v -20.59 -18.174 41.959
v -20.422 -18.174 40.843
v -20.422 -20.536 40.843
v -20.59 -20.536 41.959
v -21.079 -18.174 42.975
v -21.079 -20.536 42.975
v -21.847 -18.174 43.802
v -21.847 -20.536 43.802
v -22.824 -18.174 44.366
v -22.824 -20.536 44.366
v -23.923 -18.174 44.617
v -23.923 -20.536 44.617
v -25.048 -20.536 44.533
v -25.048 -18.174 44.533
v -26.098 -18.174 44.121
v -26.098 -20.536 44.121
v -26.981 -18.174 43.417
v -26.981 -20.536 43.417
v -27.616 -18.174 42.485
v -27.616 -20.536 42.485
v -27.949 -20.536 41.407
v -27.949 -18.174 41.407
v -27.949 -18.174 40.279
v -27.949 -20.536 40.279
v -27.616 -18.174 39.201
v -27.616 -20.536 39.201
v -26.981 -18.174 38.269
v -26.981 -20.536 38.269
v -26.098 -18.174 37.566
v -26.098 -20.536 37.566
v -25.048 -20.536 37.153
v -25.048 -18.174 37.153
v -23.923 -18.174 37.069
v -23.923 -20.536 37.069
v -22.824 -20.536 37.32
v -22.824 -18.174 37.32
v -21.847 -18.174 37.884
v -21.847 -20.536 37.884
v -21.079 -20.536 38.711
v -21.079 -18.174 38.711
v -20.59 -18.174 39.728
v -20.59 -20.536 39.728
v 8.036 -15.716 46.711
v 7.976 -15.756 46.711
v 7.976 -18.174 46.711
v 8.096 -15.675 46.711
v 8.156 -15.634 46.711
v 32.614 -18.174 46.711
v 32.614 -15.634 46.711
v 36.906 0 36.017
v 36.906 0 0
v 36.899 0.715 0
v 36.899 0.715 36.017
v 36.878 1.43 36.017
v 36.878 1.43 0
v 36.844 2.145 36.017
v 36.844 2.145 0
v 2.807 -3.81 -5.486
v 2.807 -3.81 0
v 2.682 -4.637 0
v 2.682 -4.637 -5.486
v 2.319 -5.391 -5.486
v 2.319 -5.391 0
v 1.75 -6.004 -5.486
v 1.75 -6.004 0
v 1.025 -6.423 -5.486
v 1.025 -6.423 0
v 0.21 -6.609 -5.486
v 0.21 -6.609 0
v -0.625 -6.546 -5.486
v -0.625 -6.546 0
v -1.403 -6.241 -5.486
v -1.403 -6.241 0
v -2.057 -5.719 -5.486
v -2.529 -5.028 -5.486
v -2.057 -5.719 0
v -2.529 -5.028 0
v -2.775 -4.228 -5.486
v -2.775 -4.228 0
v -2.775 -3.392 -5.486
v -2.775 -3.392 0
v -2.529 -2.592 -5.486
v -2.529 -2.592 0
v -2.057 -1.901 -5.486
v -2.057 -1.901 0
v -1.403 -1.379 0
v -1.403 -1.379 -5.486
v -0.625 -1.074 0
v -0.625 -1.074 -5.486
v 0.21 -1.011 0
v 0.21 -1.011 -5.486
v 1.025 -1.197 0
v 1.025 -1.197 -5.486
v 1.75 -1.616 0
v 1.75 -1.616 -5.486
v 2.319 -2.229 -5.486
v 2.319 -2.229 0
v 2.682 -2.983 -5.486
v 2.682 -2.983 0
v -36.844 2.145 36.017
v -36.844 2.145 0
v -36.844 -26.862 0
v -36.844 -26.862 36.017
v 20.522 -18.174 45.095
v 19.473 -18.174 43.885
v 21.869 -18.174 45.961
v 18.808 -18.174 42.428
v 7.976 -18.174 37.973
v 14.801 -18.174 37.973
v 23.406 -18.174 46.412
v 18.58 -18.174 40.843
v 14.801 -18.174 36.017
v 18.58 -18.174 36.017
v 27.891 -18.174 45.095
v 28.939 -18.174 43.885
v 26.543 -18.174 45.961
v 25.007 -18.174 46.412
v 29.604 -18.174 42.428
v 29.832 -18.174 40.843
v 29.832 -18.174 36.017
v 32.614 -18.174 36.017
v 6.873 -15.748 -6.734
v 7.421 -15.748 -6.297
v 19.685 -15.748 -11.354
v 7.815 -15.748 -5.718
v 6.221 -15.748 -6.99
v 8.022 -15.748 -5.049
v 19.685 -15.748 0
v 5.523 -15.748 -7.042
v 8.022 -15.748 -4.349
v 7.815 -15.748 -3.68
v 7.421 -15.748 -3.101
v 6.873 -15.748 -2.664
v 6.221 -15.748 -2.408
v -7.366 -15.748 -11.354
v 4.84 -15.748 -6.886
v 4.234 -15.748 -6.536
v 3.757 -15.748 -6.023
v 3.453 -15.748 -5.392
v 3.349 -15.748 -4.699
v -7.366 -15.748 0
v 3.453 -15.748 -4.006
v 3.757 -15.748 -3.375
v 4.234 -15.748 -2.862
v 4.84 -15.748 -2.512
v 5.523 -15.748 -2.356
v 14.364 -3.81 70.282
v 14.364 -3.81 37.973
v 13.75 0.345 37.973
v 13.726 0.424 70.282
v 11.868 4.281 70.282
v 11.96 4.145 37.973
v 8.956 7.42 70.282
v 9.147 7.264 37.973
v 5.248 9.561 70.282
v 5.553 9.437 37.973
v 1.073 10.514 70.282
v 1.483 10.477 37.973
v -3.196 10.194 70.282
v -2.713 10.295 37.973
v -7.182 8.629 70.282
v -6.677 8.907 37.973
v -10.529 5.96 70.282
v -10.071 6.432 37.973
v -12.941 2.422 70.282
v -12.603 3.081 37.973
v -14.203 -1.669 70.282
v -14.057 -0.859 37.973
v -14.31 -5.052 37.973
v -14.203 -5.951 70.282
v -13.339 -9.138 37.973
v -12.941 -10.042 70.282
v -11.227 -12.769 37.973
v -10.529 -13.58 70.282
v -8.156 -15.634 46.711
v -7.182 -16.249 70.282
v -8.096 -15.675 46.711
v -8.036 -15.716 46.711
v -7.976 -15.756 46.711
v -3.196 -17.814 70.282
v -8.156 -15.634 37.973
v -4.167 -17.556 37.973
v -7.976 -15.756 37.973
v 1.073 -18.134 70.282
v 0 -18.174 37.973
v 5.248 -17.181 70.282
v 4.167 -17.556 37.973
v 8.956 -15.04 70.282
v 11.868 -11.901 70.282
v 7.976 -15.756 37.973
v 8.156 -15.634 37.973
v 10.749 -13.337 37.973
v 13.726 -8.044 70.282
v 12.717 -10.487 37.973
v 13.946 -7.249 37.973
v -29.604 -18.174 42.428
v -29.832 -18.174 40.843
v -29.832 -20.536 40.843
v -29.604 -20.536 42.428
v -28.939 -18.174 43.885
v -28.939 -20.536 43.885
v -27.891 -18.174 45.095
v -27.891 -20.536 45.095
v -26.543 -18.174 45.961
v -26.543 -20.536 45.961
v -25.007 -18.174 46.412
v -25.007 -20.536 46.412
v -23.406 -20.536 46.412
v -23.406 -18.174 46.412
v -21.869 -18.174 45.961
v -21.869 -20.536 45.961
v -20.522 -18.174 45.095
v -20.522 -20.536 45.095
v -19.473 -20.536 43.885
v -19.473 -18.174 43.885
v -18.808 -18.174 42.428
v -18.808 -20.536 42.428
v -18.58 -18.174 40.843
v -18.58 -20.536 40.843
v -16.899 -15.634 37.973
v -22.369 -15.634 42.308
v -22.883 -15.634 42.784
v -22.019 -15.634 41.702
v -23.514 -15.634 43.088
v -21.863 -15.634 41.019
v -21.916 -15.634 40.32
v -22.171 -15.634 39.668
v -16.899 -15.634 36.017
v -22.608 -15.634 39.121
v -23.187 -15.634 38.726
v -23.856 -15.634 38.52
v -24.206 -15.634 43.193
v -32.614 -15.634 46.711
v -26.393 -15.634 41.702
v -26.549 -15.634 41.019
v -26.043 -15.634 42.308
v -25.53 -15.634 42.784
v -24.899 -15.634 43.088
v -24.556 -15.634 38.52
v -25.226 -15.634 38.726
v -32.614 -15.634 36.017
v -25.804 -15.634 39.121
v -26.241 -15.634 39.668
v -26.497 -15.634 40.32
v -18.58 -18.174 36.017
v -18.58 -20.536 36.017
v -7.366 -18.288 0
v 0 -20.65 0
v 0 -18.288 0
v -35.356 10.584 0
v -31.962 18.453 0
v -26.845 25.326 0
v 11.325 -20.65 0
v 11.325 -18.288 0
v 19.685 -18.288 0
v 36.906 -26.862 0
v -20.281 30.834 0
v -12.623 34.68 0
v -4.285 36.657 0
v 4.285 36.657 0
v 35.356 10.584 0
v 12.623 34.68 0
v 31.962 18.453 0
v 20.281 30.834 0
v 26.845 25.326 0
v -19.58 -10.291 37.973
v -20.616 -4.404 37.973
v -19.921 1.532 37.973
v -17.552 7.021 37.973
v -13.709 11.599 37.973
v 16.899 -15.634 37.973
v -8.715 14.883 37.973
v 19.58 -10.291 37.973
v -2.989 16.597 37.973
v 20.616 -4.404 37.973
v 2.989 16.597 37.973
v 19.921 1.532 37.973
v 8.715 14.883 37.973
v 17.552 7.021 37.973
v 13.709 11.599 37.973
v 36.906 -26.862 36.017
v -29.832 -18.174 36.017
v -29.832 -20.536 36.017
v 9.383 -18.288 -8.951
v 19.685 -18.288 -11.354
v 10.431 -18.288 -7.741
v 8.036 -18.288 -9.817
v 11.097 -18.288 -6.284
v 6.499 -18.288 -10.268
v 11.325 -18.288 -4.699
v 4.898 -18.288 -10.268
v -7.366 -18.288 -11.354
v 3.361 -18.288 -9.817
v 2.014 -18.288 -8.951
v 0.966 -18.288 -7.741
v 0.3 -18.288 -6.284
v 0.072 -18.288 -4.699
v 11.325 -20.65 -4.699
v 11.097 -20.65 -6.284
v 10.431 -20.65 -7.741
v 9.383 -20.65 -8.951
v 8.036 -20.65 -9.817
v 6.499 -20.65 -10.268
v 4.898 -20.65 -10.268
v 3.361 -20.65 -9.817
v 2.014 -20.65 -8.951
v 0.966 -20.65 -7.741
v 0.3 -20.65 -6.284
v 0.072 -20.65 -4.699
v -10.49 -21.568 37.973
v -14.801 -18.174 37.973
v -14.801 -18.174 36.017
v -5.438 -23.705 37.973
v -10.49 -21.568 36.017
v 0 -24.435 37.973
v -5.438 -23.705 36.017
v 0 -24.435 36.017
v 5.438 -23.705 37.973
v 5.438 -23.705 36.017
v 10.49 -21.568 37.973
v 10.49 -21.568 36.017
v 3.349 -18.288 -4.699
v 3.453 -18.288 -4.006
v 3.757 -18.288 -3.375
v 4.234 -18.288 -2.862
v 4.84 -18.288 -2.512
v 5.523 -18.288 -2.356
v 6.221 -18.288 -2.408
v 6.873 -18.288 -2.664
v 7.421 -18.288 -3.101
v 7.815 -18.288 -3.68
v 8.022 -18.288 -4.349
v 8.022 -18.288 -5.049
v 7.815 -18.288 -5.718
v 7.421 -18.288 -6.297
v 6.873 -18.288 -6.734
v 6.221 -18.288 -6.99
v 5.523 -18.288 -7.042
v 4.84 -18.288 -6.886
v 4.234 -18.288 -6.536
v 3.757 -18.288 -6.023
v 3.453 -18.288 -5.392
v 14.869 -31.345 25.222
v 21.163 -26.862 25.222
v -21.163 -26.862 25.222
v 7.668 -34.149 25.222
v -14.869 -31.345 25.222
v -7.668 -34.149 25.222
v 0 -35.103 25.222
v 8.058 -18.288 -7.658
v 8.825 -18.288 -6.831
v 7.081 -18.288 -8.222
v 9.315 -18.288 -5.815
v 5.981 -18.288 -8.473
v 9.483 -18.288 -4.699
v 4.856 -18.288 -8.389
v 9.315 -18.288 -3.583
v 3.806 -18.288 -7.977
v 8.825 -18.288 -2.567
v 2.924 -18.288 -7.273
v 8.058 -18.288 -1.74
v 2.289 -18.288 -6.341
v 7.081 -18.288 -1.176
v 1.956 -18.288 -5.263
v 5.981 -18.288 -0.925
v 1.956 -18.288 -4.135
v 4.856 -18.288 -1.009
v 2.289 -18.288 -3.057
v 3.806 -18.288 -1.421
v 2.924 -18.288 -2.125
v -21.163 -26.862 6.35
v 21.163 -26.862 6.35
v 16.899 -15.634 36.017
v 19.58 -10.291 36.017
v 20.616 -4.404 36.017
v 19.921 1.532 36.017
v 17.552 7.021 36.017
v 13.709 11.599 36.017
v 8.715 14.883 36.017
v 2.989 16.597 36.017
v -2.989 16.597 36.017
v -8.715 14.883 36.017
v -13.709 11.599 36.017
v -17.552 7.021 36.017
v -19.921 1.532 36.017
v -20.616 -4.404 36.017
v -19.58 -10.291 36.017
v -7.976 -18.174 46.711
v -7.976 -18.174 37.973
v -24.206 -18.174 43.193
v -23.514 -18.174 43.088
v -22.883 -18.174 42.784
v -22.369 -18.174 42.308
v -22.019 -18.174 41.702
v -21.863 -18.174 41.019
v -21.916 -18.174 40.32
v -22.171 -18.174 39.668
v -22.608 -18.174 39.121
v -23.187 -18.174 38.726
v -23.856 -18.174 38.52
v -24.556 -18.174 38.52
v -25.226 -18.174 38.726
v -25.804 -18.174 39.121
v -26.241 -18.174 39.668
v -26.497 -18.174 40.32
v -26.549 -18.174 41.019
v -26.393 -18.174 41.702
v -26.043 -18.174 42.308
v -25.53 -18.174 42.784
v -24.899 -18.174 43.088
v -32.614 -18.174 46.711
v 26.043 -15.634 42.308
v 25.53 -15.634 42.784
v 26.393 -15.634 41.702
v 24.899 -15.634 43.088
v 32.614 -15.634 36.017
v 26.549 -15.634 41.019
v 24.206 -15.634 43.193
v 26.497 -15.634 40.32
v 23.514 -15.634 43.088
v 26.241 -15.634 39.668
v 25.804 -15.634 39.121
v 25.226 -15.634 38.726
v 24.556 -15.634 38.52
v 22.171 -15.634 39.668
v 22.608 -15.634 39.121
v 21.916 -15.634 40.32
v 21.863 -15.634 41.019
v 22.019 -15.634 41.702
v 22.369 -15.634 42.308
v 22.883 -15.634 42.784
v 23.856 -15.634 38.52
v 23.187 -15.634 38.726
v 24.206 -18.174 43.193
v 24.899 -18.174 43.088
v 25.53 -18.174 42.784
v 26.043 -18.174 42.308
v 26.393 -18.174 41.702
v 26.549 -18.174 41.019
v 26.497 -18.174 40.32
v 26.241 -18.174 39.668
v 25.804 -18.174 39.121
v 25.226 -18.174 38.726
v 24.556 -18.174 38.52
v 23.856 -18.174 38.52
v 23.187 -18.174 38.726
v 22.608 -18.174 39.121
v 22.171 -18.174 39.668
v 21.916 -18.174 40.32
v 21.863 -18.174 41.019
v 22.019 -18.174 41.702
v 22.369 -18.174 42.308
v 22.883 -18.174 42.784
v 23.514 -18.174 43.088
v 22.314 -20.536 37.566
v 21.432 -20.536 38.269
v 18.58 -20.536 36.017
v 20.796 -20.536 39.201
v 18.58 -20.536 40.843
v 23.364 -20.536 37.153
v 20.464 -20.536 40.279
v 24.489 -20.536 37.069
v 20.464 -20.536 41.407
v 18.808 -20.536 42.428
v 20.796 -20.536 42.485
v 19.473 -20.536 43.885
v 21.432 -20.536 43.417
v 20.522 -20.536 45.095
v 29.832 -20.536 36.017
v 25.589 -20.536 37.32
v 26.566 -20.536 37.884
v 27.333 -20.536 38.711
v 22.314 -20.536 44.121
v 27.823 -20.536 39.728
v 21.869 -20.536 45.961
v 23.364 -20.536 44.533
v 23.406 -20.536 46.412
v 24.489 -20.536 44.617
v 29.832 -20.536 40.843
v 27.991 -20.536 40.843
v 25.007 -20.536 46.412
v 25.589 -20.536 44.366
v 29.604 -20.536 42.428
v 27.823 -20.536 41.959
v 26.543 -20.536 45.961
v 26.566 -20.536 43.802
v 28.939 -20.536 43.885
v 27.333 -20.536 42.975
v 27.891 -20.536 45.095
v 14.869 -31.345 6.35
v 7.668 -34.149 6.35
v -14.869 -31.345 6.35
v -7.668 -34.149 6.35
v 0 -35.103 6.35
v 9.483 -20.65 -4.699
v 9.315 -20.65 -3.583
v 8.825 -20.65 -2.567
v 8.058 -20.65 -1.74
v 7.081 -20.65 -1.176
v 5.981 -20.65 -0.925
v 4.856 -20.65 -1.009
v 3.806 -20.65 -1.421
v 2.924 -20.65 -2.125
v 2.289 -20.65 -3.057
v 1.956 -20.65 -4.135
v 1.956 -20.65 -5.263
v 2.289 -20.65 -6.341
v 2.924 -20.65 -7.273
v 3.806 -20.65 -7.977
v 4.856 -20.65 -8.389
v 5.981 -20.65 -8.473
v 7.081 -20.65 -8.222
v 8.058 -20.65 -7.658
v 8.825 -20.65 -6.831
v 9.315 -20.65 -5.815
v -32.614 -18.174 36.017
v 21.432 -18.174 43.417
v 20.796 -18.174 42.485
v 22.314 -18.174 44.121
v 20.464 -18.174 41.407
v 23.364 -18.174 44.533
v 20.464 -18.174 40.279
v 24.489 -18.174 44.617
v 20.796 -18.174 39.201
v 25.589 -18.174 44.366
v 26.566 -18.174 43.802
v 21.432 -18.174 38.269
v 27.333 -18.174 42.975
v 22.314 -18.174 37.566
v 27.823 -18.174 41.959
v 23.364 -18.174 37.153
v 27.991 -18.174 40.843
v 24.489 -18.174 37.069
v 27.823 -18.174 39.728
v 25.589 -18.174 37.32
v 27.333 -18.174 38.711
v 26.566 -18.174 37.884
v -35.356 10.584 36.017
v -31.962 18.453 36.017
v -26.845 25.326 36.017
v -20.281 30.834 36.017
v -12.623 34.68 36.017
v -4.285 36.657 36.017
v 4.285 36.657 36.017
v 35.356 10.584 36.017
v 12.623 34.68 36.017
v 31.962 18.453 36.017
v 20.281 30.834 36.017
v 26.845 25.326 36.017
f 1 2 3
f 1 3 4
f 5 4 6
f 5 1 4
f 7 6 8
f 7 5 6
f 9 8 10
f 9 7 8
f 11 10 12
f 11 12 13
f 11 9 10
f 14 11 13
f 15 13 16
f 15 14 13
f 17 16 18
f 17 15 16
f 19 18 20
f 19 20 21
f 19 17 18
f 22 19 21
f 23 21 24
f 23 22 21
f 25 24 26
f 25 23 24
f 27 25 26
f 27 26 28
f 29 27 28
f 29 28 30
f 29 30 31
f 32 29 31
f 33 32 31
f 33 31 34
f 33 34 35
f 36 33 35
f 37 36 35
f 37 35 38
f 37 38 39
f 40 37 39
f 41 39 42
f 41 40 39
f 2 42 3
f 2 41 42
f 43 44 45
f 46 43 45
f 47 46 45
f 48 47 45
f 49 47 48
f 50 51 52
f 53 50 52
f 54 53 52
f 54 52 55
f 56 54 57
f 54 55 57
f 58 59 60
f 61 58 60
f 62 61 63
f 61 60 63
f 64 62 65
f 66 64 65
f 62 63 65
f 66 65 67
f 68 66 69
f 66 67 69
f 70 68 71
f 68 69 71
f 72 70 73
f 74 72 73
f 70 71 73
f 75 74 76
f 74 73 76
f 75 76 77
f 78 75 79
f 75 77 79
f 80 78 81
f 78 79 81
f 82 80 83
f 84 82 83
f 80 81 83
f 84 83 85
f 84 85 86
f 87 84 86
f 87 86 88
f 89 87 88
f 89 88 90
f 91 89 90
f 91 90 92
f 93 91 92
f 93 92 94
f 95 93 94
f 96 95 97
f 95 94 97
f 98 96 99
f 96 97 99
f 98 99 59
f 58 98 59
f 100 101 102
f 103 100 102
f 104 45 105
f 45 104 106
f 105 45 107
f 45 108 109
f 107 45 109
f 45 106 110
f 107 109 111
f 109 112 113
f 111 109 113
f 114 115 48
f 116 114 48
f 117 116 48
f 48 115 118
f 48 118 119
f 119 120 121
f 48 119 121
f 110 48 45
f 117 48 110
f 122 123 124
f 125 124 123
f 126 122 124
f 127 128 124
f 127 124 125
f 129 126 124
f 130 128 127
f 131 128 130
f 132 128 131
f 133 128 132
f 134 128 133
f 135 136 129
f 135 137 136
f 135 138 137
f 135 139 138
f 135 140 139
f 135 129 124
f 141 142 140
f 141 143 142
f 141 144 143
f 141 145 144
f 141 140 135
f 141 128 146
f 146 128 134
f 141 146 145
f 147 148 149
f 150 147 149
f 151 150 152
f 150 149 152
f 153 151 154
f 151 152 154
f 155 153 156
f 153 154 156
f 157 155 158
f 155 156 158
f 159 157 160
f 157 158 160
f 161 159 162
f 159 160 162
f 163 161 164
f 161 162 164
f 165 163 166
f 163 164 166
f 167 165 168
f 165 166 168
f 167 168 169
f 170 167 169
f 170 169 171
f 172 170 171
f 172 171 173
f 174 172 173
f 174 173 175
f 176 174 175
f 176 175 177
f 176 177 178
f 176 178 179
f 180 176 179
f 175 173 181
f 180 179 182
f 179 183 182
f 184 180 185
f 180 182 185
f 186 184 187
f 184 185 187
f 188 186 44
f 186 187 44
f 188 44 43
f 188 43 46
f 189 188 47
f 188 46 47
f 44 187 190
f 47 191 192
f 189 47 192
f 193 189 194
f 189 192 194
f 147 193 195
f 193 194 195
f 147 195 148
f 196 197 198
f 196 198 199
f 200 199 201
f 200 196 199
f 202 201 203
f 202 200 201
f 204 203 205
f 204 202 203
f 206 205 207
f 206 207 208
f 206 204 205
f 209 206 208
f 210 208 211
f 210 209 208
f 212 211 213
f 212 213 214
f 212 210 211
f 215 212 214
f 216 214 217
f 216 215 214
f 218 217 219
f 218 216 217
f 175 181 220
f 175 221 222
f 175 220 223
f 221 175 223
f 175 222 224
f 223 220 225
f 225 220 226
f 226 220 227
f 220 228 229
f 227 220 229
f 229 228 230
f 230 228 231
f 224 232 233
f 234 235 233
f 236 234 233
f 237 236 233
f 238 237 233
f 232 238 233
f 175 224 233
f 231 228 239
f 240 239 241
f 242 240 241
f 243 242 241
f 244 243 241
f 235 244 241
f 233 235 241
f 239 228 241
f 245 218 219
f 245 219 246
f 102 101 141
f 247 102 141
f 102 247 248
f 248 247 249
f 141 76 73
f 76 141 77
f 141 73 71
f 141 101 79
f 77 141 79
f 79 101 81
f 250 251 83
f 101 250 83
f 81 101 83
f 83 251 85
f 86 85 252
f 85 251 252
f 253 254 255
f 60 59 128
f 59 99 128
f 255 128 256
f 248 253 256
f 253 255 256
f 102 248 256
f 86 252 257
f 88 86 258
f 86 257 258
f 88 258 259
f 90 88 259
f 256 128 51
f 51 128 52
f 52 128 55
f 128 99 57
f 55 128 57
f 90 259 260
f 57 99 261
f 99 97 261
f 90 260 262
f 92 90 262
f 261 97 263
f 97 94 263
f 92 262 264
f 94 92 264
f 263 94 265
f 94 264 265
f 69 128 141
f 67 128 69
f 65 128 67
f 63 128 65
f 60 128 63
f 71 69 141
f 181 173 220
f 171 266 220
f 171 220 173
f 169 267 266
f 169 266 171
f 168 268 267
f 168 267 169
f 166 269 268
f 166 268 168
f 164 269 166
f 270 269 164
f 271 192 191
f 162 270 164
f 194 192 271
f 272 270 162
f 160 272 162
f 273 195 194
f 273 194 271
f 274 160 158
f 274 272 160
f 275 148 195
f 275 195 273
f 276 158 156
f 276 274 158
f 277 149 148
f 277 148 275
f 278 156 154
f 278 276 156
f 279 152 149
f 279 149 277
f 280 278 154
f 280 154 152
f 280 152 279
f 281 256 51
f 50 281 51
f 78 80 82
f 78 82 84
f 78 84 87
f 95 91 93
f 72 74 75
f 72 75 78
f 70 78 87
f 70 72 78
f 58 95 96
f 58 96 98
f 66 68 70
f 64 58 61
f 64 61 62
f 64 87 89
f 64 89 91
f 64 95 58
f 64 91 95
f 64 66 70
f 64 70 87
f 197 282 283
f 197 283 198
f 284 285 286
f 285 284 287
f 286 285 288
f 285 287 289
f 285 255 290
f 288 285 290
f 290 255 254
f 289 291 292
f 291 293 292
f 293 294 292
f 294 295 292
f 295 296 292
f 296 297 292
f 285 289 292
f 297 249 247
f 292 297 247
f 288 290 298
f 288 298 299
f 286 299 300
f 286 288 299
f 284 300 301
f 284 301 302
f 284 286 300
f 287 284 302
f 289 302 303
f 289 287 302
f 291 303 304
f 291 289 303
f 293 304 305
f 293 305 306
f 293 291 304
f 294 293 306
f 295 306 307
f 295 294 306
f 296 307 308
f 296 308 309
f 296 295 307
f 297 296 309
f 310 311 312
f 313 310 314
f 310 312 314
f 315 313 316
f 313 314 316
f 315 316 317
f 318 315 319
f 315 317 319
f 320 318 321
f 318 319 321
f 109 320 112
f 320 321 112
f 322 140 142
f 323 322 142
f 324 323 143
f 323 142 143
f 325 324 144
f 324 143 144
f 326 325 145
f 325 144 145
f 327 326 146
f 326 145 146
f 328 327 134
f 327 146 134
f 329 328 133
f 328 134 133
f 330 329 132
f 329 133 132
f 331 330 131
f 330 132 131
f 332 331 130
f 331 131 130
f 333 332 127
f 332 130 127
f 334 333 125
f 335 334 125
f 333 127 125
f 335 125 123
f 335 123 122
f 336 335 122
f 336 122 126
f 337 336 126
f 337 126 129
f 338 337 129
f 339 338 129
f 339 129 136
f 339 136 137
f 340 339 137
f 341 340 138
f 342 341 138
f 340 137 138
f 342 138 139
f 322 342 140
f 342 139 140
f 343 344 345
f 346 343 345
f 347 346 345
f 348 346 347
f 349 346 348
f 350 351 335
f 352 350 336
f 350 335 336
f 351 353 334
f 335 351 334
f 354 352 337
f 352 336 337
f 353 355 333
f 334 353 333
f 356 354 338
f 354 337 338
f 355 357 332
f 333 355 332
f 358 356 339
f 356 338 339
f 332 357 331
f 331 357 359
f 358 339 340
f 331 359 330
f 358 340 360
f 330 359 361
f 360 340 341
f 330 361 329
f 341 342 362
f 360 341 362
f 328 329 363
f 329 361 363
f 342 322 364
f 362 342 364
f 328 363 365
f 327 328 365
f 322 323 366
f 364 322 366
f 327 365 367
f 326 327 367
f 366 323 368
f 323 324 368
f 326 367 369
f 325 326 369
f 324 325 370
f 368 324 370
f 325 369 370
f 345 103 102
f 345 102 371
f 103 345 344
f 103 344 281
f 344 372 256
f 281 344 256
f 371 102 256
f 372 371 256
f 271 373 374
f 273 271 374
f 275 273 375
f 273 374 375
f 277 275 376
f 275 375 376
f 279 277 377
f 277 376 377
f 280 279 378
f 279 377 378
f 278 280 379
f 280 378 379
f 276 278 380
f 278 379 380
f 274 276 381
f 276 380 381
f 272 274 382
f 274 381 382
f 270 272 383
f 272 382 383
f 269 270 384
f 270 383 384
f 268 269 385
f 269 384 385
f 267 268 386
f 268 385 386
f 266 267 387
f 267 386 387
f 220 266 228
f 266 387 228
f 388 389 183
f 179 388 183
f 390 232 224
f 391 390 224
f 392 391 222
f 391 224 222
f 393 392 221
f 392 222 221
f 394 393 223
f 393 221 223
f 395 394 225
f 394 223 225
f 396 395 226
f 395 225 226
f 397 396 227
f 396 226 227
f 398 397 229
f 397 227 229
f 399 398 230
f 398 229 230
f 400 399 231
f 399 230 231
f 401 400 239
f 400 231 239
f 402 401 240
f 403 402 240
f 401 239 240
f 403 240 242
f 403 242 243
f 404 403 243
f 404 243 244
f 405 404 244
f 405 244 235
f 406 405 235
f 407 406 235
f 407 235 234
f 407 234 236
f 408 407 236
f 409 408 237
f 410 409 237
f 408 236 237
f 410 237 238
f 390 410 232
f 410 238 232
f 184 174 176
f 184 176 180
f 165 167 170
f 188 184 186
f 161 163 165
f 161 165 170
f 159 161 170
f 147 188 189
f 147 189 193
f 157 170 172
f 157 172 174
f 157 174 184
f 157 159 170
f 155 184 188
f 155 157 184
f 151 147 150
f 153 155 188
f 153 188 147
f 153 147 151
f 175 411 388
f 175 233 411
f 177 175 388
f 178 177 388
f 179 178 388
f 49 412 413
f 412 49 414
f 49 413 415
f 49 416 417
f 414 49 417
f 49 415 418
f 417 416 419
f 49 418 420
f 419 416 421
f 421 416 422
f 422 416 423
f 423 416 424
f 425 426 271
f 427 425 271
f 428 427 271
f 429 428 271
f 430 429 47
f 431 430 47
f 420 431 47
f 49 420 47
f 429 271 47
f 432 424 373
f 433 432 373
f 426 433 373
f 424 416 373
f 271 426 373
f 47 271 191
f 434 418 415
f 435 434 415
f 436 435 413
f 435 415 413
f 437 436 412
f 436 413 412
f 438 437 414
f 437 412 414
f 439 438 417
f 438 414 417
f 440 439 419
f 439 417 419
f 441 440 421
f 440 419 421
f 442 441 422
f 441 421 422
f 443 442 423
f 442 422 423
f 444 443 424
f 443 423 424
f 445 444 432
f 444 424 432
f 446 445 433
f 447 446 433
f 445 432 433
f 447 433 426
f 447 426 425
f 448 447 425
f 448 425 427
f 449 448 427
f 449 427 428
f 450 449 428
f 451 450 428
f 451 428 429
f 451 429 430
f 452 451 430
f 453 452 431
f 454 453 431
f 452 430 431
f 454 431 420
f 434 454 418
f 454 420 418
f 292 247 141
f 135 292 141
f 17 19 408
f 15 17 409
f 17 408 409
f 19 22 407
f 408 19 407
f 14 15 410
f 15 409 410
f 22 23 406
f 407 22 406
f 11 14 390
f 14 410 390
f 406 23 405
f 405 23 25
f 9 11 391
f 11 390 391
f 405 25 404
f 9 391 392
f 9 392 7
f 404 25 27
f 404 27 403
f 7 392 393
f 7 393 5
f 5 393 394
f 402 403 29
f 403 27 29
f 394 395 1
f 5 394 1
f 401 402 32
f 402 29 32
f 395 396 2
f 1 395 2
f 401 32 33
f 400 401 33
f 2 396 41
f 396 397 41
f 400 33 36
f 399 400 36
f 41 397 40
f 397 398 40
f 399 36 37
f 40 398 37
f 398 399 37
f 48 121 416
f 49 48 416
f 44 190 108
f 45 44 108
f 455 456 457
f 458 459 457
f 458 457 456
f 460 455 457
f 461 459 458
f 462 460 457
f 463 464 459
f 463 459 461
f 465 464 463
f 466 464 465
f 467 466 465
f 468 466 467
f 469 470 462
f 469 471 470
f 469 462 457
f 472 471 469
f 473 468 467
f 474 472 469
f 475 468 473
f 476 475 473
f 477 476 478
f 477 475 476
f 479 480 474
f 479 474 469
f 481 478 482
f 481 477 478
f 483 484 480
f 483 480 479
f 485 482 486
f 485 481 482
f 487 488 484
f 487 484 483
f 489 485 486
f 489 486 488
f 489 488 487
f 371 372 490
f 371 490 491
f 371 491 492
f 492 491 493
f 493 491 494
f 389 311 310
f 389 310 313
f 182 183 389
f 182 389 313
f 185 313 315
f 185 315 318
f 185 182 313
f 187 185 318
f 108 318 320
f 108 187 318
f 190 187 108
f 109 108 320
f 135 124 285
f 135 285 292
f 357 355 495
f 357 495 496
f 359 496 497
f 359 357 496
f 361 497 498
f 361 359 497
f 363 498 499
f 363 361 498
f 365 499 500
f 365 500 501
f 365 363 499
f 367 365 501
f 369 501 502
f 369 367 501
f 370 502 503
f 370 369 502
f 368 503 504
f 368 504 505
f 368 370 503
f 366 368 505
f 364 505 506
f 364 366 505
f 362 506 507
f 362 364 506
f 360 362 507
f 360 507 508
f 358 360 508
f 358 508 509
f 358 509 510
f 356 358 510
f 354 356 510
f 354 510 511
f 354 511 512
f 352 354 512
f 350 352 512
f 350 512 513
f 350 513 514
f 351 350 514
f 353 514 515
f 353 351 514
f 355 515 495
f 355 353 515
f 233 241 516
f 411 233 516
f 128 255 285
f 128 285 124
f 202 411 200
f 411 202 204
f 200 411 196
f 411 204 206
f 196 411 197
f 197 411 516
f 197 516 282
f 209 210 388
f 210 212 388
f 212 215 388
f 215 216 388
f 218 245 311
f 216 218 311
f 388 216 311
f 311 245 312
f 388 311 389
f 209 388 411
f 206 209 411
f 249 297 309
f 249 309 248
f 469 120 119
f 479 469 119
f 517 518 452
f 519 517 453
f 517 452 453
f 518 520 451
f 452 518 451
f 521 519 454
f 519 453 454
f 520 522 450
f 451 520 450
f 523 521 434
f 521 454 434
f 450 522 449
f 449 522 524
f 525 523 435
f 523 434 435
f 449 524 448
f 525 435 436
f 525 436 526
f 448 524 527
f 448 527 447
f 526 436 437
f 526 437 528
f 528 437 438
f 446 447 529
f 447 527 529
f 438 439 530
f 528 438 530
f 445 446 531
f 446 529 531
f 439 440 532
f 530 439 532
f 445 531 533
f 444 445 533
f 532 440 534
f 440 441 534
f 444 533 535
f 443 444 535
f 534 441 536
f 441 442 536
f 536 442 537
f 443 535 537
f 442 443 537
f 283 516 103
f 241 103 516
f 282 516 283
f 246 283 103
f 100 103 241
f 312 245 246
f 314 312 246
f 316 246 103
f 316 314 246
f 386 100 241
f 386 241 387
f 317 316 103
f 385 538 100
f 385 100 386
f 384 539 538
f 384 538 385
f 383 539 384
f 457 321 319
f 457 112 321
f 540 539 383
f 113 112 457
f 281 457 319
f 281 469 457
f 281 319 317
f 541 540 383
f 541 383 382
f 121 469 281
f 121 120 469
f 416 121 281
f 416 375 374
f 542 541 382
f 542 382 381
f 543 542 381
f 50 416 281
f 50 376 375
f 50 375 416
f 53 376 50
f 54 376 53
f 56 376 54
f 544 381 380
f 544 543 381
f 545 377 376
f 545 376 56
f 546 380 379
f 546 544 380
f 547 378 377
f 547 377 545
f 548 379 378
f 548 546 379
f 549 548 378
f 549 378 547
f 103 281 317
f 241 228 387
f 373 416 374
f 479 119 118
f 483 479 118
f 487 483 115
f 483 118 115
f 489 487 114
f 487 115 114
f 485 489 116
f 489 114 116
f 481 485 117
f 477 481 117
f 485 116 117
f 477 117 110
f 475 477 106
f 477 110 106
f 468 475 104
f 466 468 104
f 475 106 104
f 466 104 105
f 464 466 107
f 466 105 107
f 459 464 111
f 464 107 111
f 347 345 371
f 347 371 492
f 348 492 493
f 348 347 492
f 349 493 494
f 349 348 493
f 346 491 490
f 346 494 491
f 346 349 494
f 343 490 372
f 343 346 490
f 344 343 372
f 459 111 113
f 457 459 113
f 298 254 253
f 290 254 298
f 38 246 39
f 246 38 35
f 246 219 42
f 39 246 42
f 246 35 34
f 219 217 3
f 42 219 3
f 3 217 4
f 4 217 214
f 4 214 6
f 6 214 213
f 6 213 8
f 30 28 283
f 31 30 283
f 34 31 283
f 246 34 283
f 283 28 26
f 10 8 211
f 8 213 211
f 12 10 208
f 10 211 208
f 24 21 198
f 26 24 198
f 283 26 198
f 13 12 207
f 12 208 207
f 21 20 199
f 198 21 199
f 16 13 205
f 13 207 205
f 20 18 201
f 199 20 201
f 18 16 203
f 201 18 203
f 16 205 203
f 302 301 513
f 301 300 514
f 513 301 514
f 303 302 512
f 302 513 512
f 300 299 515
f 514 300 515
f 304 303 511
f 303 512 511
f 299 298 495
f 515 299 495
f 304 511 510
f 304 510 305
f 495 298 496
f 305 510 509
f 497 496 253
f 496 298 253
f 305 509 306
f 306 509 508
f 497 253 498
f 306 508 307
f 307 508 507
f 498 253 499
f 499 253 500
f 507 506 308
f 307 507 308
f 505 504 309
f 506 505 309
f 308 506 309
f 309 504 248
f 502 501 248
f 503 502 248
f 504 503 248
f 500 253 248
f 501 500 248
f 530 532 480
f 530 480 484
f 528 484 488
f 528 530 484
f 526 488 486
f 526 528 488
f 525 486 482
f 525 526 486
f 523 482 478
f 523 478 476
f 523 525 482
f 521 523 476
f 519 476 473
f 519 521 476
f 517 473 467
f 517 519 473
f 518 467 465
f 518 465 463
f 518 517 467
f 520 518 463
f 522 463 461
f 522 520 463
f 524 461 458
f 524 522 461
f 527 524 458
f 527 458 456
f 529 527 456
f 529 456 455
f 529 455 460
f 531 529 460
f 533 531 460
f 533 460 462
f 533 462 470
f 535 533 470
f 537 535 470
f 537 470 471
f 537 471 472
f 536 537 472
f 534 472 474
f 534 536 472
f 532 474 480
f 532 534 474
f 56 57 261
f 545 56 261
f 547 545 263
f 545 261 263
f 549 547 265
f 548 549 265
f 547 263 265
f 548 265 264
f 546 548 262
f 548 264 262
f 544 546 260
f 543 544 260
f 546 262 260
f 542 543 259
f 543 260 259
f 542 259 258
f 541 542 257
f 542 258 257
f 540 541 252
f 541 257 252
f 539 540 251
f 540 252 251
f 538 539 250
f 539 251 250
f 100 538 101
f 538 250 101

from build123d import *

# Parameters (mm, degrees)
BOSS_EXTRUDE1_DEPTH  = 36.0172
SKETCH7_R            = 31.2928
BOSS_EXTRUDE4_DEPTH  = 36.0172
CUT_EXTRUDE2_START   = -6.35
CUT_EXTRUDE2_DEPTH   = 6.35
CUT_EXTRUDE3_DEPTH   = 10.795
SKETCH10_R           = 2.8067
BOSS_EXTRUDE5_DEPTH  = 5.4864
SKETCH11_R           = 20.6248
BOSS_EXTRUDE6_DEPTH  = 1.9558
SKETCH12_R           = 14.3637
BOSS_EXTRUDE7_DEPTH  = 32.3088
BOSS_EXTRUDE9_DEPTH  = 10.6934
SKETCH14_R           = 2.3495
CUT_EXTRUDE4_DEPTH   = 2.54
SKETCH15_W           = 27.051
SKETCH15_H           = 2.54
BOSS_EXTRUDE10_DEPTH = 11.3538
SKETCH16_R           = 2.3495
CUT_EXTRUDE5_DEPTH   = 2.54
SKETCH17_R           = 3.7846
BOSS_EXTRUDE11_DEPTH = 2.3622
SKETCH18_R           = 3.7846
BOSS_EXTRUDE13_DEPTH = 2.3622


with BuildPart() as part:
    # Sketch1 → Boss-Extrude1 (new body)
    with BuildSketch(Plane.XY):
        with BuildLine():
            ThreePointArc((36.843812273, 2.145016468), (0, 36.9062), (-36.843812273, 2.145016468))
            Line((-36.843812273, 2.145016468), (36.843812273, 2.145016468))
        make_face()
        with BuildLine():
            Line((36.843812273, 2.145016468), (-36.843812273, 2.145016468))
            Line((-36.843812273, 2.145016468), (-36.843812273, -2.145016468))
            ThreePointArc((-36.843812273, -2.145016468), (-33.44326867, -15.608183082), (-25.30834218, -26.861783532))
            Line((-25.30834218, -26.861783532), (25.30834218, -26.861783532))
            ThreePointArc((25.30834218, -26.861783532), (33.882903776, -14.629300398), (36.9062, 0))
            ThreePointArc((36.9062, 0), (36.890599771, 1.072961774), (36.843812273, 2.145016468))
        make_face()
        with BuildLine():
            Line((36.9062, -26.861783532), (36.9062, 0))
            ThreePointArc((36.9062, 0), (33.882903776, -14.629300398), (25.30834218, -26.861783532))
            Line((25.30834218, -26.861783532), (36.9062, -26.861783532))
        make_face()
        with BuildLine():
            ThreePointArc((-25.30834218, -26.861783532), (-33.44326867, -15.608183082), (-36.843812273, -2.145016468))
            Line((-36.843812273, -2.145016468), (-36.843812273, -26.861783532))
            Line((-36.843812273, -26.861783532), (-25.30834218, -26.861783532))
        make_face()
    extrude(amount=BOSS_EXTRUDE1_DEPTH)

    # Sketch7 → Boss-Extrude4 (add)
    with BuildSketch(Plane.XY.offset(36.0172)):
        with Locations((0, -3.81)):
            Circle(SKETCH7_R)
    extrude(amount=-BOSS_EXTRUDE4_DEPTH)

    # Sketch6 → Cut-Extrude2 (cut)
    with BuildSketch(Plane(origin=(0, 0, 0), x_dir=(-1, 0, 0), z_dir=(0, 0, -1)).offset(CUT_EXTRUDE2_START)):
        with BuildLine():
            Line((21.162575643, -26.861783532), (-21.162575643, -26.861783532))
            ThreePointArc((-21.162575643, -26.861783532), (0, -35.1028), (21.162575643, -26.861783532))
        make_face()
    extrude(amount=CUT_EXTRUDE2_DEPTH, mode=Mode.SUBTRACT)

    # Sketch9 → Cut-Extrude3 (cut)
    with BuildSketch(Plane.XY.offset(36.0172)):
        with BuildLine():
            Line((-21.162575643, -26.861783532), (21.162575643, -26.861783532))
            ThreePointArc((21.162575643, -26.861783532), (0, -35.1028), (-21.162575643, -26.861783532))
        make_face()
    extrude(amount=-CUT_EXTRUDE3_DEPTH, mode=Mode.SUBTRACT)

    # Sketch10 → Boss-Extrude5 (add)
    with BuildSketch(Plane(origin=(0, 0, 0), x_dir=(-1, 0, 0), z_dir=(0, 0, -1))):
        with Locations(Location((0, -3.81, 0), (0, 0, 180))):
            Circle(SKETCH10_R)
    extrude(amount=BOSS_EXTRUDE5_DEPTH)

    # Sketch11 → Boss-Extrude6 (add)
    with BuildSketch(Plane.XY.offset(36.0172)):
        with Locations((0, -3.81)):
            Circle(SKETCH11_R)
    extrude(amount=BOSS_EXTRUDE6_DEPTH)

    # Sketch12 → Boss-Extrude7 (add)
    with BuildSketch(Plane.XY.offset(37.973)):
        with Locations((0, -3.81)):
            Circle(SKETCH12_R)
    extrude(amount=BOSS_EXTRUDE7_DEPTH)

    # Sketch13 → Boss-Extrude9 (add)
    with BuildSketch(Plane.XY.offset(36.0172)):
        with BuildLine():
            Line((-32.6136, -18.1737), (-14.800895154, -18.1737))
            ThreePointArc((-14.800895154, -18.1737), (-15.900839256, -16.945664657), (-16.899186174, -15.6337))
            Line((-16.899186174, -15.6337), (-32.6136, -15.6337))
            Line((-32.6136, -15.6337), (-32.6136, -18.1737))
        make_face()
        with BuildLine():
            ThreePointArc((-16.899186174, -15.6337), (-15.900839256, -16.945664657), (-14.800895154, -18.1737))
            Line((-14.800895154, -18.1737), (-7.9756, -18.1737))
            Line((-7.9756, -18.1737), (-7.9756, -15.755948365))
            ThreePointArc((-7.9756, -15.755948365), (-8.065898573, -15.695165455), (-8.155733934, -15.6337))
            Line((-8.155733934, -15.6337), (-16.899186174, -15.6337))
        make_face()
        with BuildLine():
            Line((7.9756, -18.1737), (14.800895154, -18.1737))
            ThreePointArc((14.800895154, -18.1737), (15.900839256, -16.945664657), (16.899186174, -15.6337))
            Line((16.899186174, -15.6337), (8.155733934, -15.6337))
            ThreePointArc((8.155733934, -15.6337), (8.065898573, -15.695165455), (7.9756, -15.755948365))
            Line((7.9756, -15.755948365), (7.9756, -18.1737))
        make_face()
        with BuildLine():
            Line((14.800895154, -18.1737), (32.6136, -18.1737))
            Line((32.6136, -18.1737), (32.6136, -15.6337))
            Line((32.6136, -15.6337), (16.899186174, -15.6337))
            ThreePointArc((16.899186174, -15.6337), (15.900839256, -16.945664657), (14.800895154, -18.1737))
        make_face()
    extrude(amount=BOSS_EXTRUDE9_DEPTH)

    # Sketch14 → Cut-Extrude4 (cut)
    with BuildSketch(Plane(origin=(0, -15.6337, 0), x_dir=(1, 0, 0), z_dir=(0, 1, 0))):
        with Locations(Location((-24.2062, -40.8432, 0), (0, 0, 270))):
            Circle(SKETCH14_R)
        with Locations(Location((24.2062, -40.8432, 0), (0, 0, 270))):
            Circle(SKETCH14_R)
    extrude(amount=-CUT_EXTRUDE4_DEPTH, mode=Mode.SUBTRACT)

    # Sketch15 → Boss-Extrude10 (add)
    with BuildSketch(Plane(origin=(0, 0, 0), x_dir=(-1, 0, 0), z_dir=(0, 0, -1))):
        with Locations((-6.1595, -17.018)):
            Rectangle(SKETCH15_W, SKETCH15_H)
    extrude(amount=BOSS_EXTRUDE10_DEPTH)

    # Sketch16 → Cut-Extrude5 (cut)
    with BuildSketch(Plane(origin=(0, -15.748, 0), x_dir=(1, 0, 0), z_dir=(0, 1, 0))):
        with Locations(Location((5.698514736, 4.699, 0), (0, 0, 180))):
            Circle(SKETCH16_R)
    extrude(amount=-CUT_EXTRUDE5_DEPTH, mode=Mode.SUBTRACT)

    # Sketch17 → Boss-Extrude11 (add)
    with BuildSketch(Plane.XZ.offset(18.288)):
        with BuildLine():
            Line((0.072414736, -4.699), (0, 0))
            Line((0, 0), (11.324614736, 0))
            Line((11.324614736, 0), (11.324614736, -4.699))
            ThreePointArc((11.324614736, -4.699), (5.698514736, -10.3251), (0.072414736, -4.699))
        make_face()
        with Locations((5.698514736, -4.699)):
            Circle(SKETCH17_R, mode=Mode.SUBTRACT)
    extrude(amount=BOSS_EXTRUDE11_DEPTH)

    # Sketch18 → Boss-Extrude13 (add)
    # profile 1 of 2: a face of its own
    with BuildSketch(Plane.XZ.offset(18.1737)):
        with BuildLine():
            Line((-18.5801, 40.8432), (-18.5801, 36.0172))
            Line((-18.5801, 36.0172), (-29.8323, 36.0172))
            Line((-29.8323, 36.0172), (-29.8323, 40.8432))
            ThreePointArc((-29.8323, 40.8432), (-24.2062, 46.4693), (-18.5801, 40.8432))
        make_face()
        with Locations((-24.2062, 40.8432)):
            Circle(SKETCH18_R, mode=Mode.SUBTRACT)
    # profile 2 of 2: a face of its own
    with BuildSketch(Plane.XZ.offset(18.1737)):
        with BuildLine():
            Line((29.8323, 36.0172), (29.8323, 40.8432))
            ThreePointArc((29.8323, 40.8432), (24.2062, 46.4693), (18.5801, 40.8432))
            Line((18.5801, 40.8432), (18.5801, 36.0172))
            Line((18.5801, 36.0172), (29.8323, 36.0172))
        make_face()
        with Locations((24.2062, 40.8432)):
            Circle(SKETCH18_R, mode=Mode.SUBTRACT)
    extrude(amount=BOSS_EXTRUDE13_DEPTH)


solid = part.part
